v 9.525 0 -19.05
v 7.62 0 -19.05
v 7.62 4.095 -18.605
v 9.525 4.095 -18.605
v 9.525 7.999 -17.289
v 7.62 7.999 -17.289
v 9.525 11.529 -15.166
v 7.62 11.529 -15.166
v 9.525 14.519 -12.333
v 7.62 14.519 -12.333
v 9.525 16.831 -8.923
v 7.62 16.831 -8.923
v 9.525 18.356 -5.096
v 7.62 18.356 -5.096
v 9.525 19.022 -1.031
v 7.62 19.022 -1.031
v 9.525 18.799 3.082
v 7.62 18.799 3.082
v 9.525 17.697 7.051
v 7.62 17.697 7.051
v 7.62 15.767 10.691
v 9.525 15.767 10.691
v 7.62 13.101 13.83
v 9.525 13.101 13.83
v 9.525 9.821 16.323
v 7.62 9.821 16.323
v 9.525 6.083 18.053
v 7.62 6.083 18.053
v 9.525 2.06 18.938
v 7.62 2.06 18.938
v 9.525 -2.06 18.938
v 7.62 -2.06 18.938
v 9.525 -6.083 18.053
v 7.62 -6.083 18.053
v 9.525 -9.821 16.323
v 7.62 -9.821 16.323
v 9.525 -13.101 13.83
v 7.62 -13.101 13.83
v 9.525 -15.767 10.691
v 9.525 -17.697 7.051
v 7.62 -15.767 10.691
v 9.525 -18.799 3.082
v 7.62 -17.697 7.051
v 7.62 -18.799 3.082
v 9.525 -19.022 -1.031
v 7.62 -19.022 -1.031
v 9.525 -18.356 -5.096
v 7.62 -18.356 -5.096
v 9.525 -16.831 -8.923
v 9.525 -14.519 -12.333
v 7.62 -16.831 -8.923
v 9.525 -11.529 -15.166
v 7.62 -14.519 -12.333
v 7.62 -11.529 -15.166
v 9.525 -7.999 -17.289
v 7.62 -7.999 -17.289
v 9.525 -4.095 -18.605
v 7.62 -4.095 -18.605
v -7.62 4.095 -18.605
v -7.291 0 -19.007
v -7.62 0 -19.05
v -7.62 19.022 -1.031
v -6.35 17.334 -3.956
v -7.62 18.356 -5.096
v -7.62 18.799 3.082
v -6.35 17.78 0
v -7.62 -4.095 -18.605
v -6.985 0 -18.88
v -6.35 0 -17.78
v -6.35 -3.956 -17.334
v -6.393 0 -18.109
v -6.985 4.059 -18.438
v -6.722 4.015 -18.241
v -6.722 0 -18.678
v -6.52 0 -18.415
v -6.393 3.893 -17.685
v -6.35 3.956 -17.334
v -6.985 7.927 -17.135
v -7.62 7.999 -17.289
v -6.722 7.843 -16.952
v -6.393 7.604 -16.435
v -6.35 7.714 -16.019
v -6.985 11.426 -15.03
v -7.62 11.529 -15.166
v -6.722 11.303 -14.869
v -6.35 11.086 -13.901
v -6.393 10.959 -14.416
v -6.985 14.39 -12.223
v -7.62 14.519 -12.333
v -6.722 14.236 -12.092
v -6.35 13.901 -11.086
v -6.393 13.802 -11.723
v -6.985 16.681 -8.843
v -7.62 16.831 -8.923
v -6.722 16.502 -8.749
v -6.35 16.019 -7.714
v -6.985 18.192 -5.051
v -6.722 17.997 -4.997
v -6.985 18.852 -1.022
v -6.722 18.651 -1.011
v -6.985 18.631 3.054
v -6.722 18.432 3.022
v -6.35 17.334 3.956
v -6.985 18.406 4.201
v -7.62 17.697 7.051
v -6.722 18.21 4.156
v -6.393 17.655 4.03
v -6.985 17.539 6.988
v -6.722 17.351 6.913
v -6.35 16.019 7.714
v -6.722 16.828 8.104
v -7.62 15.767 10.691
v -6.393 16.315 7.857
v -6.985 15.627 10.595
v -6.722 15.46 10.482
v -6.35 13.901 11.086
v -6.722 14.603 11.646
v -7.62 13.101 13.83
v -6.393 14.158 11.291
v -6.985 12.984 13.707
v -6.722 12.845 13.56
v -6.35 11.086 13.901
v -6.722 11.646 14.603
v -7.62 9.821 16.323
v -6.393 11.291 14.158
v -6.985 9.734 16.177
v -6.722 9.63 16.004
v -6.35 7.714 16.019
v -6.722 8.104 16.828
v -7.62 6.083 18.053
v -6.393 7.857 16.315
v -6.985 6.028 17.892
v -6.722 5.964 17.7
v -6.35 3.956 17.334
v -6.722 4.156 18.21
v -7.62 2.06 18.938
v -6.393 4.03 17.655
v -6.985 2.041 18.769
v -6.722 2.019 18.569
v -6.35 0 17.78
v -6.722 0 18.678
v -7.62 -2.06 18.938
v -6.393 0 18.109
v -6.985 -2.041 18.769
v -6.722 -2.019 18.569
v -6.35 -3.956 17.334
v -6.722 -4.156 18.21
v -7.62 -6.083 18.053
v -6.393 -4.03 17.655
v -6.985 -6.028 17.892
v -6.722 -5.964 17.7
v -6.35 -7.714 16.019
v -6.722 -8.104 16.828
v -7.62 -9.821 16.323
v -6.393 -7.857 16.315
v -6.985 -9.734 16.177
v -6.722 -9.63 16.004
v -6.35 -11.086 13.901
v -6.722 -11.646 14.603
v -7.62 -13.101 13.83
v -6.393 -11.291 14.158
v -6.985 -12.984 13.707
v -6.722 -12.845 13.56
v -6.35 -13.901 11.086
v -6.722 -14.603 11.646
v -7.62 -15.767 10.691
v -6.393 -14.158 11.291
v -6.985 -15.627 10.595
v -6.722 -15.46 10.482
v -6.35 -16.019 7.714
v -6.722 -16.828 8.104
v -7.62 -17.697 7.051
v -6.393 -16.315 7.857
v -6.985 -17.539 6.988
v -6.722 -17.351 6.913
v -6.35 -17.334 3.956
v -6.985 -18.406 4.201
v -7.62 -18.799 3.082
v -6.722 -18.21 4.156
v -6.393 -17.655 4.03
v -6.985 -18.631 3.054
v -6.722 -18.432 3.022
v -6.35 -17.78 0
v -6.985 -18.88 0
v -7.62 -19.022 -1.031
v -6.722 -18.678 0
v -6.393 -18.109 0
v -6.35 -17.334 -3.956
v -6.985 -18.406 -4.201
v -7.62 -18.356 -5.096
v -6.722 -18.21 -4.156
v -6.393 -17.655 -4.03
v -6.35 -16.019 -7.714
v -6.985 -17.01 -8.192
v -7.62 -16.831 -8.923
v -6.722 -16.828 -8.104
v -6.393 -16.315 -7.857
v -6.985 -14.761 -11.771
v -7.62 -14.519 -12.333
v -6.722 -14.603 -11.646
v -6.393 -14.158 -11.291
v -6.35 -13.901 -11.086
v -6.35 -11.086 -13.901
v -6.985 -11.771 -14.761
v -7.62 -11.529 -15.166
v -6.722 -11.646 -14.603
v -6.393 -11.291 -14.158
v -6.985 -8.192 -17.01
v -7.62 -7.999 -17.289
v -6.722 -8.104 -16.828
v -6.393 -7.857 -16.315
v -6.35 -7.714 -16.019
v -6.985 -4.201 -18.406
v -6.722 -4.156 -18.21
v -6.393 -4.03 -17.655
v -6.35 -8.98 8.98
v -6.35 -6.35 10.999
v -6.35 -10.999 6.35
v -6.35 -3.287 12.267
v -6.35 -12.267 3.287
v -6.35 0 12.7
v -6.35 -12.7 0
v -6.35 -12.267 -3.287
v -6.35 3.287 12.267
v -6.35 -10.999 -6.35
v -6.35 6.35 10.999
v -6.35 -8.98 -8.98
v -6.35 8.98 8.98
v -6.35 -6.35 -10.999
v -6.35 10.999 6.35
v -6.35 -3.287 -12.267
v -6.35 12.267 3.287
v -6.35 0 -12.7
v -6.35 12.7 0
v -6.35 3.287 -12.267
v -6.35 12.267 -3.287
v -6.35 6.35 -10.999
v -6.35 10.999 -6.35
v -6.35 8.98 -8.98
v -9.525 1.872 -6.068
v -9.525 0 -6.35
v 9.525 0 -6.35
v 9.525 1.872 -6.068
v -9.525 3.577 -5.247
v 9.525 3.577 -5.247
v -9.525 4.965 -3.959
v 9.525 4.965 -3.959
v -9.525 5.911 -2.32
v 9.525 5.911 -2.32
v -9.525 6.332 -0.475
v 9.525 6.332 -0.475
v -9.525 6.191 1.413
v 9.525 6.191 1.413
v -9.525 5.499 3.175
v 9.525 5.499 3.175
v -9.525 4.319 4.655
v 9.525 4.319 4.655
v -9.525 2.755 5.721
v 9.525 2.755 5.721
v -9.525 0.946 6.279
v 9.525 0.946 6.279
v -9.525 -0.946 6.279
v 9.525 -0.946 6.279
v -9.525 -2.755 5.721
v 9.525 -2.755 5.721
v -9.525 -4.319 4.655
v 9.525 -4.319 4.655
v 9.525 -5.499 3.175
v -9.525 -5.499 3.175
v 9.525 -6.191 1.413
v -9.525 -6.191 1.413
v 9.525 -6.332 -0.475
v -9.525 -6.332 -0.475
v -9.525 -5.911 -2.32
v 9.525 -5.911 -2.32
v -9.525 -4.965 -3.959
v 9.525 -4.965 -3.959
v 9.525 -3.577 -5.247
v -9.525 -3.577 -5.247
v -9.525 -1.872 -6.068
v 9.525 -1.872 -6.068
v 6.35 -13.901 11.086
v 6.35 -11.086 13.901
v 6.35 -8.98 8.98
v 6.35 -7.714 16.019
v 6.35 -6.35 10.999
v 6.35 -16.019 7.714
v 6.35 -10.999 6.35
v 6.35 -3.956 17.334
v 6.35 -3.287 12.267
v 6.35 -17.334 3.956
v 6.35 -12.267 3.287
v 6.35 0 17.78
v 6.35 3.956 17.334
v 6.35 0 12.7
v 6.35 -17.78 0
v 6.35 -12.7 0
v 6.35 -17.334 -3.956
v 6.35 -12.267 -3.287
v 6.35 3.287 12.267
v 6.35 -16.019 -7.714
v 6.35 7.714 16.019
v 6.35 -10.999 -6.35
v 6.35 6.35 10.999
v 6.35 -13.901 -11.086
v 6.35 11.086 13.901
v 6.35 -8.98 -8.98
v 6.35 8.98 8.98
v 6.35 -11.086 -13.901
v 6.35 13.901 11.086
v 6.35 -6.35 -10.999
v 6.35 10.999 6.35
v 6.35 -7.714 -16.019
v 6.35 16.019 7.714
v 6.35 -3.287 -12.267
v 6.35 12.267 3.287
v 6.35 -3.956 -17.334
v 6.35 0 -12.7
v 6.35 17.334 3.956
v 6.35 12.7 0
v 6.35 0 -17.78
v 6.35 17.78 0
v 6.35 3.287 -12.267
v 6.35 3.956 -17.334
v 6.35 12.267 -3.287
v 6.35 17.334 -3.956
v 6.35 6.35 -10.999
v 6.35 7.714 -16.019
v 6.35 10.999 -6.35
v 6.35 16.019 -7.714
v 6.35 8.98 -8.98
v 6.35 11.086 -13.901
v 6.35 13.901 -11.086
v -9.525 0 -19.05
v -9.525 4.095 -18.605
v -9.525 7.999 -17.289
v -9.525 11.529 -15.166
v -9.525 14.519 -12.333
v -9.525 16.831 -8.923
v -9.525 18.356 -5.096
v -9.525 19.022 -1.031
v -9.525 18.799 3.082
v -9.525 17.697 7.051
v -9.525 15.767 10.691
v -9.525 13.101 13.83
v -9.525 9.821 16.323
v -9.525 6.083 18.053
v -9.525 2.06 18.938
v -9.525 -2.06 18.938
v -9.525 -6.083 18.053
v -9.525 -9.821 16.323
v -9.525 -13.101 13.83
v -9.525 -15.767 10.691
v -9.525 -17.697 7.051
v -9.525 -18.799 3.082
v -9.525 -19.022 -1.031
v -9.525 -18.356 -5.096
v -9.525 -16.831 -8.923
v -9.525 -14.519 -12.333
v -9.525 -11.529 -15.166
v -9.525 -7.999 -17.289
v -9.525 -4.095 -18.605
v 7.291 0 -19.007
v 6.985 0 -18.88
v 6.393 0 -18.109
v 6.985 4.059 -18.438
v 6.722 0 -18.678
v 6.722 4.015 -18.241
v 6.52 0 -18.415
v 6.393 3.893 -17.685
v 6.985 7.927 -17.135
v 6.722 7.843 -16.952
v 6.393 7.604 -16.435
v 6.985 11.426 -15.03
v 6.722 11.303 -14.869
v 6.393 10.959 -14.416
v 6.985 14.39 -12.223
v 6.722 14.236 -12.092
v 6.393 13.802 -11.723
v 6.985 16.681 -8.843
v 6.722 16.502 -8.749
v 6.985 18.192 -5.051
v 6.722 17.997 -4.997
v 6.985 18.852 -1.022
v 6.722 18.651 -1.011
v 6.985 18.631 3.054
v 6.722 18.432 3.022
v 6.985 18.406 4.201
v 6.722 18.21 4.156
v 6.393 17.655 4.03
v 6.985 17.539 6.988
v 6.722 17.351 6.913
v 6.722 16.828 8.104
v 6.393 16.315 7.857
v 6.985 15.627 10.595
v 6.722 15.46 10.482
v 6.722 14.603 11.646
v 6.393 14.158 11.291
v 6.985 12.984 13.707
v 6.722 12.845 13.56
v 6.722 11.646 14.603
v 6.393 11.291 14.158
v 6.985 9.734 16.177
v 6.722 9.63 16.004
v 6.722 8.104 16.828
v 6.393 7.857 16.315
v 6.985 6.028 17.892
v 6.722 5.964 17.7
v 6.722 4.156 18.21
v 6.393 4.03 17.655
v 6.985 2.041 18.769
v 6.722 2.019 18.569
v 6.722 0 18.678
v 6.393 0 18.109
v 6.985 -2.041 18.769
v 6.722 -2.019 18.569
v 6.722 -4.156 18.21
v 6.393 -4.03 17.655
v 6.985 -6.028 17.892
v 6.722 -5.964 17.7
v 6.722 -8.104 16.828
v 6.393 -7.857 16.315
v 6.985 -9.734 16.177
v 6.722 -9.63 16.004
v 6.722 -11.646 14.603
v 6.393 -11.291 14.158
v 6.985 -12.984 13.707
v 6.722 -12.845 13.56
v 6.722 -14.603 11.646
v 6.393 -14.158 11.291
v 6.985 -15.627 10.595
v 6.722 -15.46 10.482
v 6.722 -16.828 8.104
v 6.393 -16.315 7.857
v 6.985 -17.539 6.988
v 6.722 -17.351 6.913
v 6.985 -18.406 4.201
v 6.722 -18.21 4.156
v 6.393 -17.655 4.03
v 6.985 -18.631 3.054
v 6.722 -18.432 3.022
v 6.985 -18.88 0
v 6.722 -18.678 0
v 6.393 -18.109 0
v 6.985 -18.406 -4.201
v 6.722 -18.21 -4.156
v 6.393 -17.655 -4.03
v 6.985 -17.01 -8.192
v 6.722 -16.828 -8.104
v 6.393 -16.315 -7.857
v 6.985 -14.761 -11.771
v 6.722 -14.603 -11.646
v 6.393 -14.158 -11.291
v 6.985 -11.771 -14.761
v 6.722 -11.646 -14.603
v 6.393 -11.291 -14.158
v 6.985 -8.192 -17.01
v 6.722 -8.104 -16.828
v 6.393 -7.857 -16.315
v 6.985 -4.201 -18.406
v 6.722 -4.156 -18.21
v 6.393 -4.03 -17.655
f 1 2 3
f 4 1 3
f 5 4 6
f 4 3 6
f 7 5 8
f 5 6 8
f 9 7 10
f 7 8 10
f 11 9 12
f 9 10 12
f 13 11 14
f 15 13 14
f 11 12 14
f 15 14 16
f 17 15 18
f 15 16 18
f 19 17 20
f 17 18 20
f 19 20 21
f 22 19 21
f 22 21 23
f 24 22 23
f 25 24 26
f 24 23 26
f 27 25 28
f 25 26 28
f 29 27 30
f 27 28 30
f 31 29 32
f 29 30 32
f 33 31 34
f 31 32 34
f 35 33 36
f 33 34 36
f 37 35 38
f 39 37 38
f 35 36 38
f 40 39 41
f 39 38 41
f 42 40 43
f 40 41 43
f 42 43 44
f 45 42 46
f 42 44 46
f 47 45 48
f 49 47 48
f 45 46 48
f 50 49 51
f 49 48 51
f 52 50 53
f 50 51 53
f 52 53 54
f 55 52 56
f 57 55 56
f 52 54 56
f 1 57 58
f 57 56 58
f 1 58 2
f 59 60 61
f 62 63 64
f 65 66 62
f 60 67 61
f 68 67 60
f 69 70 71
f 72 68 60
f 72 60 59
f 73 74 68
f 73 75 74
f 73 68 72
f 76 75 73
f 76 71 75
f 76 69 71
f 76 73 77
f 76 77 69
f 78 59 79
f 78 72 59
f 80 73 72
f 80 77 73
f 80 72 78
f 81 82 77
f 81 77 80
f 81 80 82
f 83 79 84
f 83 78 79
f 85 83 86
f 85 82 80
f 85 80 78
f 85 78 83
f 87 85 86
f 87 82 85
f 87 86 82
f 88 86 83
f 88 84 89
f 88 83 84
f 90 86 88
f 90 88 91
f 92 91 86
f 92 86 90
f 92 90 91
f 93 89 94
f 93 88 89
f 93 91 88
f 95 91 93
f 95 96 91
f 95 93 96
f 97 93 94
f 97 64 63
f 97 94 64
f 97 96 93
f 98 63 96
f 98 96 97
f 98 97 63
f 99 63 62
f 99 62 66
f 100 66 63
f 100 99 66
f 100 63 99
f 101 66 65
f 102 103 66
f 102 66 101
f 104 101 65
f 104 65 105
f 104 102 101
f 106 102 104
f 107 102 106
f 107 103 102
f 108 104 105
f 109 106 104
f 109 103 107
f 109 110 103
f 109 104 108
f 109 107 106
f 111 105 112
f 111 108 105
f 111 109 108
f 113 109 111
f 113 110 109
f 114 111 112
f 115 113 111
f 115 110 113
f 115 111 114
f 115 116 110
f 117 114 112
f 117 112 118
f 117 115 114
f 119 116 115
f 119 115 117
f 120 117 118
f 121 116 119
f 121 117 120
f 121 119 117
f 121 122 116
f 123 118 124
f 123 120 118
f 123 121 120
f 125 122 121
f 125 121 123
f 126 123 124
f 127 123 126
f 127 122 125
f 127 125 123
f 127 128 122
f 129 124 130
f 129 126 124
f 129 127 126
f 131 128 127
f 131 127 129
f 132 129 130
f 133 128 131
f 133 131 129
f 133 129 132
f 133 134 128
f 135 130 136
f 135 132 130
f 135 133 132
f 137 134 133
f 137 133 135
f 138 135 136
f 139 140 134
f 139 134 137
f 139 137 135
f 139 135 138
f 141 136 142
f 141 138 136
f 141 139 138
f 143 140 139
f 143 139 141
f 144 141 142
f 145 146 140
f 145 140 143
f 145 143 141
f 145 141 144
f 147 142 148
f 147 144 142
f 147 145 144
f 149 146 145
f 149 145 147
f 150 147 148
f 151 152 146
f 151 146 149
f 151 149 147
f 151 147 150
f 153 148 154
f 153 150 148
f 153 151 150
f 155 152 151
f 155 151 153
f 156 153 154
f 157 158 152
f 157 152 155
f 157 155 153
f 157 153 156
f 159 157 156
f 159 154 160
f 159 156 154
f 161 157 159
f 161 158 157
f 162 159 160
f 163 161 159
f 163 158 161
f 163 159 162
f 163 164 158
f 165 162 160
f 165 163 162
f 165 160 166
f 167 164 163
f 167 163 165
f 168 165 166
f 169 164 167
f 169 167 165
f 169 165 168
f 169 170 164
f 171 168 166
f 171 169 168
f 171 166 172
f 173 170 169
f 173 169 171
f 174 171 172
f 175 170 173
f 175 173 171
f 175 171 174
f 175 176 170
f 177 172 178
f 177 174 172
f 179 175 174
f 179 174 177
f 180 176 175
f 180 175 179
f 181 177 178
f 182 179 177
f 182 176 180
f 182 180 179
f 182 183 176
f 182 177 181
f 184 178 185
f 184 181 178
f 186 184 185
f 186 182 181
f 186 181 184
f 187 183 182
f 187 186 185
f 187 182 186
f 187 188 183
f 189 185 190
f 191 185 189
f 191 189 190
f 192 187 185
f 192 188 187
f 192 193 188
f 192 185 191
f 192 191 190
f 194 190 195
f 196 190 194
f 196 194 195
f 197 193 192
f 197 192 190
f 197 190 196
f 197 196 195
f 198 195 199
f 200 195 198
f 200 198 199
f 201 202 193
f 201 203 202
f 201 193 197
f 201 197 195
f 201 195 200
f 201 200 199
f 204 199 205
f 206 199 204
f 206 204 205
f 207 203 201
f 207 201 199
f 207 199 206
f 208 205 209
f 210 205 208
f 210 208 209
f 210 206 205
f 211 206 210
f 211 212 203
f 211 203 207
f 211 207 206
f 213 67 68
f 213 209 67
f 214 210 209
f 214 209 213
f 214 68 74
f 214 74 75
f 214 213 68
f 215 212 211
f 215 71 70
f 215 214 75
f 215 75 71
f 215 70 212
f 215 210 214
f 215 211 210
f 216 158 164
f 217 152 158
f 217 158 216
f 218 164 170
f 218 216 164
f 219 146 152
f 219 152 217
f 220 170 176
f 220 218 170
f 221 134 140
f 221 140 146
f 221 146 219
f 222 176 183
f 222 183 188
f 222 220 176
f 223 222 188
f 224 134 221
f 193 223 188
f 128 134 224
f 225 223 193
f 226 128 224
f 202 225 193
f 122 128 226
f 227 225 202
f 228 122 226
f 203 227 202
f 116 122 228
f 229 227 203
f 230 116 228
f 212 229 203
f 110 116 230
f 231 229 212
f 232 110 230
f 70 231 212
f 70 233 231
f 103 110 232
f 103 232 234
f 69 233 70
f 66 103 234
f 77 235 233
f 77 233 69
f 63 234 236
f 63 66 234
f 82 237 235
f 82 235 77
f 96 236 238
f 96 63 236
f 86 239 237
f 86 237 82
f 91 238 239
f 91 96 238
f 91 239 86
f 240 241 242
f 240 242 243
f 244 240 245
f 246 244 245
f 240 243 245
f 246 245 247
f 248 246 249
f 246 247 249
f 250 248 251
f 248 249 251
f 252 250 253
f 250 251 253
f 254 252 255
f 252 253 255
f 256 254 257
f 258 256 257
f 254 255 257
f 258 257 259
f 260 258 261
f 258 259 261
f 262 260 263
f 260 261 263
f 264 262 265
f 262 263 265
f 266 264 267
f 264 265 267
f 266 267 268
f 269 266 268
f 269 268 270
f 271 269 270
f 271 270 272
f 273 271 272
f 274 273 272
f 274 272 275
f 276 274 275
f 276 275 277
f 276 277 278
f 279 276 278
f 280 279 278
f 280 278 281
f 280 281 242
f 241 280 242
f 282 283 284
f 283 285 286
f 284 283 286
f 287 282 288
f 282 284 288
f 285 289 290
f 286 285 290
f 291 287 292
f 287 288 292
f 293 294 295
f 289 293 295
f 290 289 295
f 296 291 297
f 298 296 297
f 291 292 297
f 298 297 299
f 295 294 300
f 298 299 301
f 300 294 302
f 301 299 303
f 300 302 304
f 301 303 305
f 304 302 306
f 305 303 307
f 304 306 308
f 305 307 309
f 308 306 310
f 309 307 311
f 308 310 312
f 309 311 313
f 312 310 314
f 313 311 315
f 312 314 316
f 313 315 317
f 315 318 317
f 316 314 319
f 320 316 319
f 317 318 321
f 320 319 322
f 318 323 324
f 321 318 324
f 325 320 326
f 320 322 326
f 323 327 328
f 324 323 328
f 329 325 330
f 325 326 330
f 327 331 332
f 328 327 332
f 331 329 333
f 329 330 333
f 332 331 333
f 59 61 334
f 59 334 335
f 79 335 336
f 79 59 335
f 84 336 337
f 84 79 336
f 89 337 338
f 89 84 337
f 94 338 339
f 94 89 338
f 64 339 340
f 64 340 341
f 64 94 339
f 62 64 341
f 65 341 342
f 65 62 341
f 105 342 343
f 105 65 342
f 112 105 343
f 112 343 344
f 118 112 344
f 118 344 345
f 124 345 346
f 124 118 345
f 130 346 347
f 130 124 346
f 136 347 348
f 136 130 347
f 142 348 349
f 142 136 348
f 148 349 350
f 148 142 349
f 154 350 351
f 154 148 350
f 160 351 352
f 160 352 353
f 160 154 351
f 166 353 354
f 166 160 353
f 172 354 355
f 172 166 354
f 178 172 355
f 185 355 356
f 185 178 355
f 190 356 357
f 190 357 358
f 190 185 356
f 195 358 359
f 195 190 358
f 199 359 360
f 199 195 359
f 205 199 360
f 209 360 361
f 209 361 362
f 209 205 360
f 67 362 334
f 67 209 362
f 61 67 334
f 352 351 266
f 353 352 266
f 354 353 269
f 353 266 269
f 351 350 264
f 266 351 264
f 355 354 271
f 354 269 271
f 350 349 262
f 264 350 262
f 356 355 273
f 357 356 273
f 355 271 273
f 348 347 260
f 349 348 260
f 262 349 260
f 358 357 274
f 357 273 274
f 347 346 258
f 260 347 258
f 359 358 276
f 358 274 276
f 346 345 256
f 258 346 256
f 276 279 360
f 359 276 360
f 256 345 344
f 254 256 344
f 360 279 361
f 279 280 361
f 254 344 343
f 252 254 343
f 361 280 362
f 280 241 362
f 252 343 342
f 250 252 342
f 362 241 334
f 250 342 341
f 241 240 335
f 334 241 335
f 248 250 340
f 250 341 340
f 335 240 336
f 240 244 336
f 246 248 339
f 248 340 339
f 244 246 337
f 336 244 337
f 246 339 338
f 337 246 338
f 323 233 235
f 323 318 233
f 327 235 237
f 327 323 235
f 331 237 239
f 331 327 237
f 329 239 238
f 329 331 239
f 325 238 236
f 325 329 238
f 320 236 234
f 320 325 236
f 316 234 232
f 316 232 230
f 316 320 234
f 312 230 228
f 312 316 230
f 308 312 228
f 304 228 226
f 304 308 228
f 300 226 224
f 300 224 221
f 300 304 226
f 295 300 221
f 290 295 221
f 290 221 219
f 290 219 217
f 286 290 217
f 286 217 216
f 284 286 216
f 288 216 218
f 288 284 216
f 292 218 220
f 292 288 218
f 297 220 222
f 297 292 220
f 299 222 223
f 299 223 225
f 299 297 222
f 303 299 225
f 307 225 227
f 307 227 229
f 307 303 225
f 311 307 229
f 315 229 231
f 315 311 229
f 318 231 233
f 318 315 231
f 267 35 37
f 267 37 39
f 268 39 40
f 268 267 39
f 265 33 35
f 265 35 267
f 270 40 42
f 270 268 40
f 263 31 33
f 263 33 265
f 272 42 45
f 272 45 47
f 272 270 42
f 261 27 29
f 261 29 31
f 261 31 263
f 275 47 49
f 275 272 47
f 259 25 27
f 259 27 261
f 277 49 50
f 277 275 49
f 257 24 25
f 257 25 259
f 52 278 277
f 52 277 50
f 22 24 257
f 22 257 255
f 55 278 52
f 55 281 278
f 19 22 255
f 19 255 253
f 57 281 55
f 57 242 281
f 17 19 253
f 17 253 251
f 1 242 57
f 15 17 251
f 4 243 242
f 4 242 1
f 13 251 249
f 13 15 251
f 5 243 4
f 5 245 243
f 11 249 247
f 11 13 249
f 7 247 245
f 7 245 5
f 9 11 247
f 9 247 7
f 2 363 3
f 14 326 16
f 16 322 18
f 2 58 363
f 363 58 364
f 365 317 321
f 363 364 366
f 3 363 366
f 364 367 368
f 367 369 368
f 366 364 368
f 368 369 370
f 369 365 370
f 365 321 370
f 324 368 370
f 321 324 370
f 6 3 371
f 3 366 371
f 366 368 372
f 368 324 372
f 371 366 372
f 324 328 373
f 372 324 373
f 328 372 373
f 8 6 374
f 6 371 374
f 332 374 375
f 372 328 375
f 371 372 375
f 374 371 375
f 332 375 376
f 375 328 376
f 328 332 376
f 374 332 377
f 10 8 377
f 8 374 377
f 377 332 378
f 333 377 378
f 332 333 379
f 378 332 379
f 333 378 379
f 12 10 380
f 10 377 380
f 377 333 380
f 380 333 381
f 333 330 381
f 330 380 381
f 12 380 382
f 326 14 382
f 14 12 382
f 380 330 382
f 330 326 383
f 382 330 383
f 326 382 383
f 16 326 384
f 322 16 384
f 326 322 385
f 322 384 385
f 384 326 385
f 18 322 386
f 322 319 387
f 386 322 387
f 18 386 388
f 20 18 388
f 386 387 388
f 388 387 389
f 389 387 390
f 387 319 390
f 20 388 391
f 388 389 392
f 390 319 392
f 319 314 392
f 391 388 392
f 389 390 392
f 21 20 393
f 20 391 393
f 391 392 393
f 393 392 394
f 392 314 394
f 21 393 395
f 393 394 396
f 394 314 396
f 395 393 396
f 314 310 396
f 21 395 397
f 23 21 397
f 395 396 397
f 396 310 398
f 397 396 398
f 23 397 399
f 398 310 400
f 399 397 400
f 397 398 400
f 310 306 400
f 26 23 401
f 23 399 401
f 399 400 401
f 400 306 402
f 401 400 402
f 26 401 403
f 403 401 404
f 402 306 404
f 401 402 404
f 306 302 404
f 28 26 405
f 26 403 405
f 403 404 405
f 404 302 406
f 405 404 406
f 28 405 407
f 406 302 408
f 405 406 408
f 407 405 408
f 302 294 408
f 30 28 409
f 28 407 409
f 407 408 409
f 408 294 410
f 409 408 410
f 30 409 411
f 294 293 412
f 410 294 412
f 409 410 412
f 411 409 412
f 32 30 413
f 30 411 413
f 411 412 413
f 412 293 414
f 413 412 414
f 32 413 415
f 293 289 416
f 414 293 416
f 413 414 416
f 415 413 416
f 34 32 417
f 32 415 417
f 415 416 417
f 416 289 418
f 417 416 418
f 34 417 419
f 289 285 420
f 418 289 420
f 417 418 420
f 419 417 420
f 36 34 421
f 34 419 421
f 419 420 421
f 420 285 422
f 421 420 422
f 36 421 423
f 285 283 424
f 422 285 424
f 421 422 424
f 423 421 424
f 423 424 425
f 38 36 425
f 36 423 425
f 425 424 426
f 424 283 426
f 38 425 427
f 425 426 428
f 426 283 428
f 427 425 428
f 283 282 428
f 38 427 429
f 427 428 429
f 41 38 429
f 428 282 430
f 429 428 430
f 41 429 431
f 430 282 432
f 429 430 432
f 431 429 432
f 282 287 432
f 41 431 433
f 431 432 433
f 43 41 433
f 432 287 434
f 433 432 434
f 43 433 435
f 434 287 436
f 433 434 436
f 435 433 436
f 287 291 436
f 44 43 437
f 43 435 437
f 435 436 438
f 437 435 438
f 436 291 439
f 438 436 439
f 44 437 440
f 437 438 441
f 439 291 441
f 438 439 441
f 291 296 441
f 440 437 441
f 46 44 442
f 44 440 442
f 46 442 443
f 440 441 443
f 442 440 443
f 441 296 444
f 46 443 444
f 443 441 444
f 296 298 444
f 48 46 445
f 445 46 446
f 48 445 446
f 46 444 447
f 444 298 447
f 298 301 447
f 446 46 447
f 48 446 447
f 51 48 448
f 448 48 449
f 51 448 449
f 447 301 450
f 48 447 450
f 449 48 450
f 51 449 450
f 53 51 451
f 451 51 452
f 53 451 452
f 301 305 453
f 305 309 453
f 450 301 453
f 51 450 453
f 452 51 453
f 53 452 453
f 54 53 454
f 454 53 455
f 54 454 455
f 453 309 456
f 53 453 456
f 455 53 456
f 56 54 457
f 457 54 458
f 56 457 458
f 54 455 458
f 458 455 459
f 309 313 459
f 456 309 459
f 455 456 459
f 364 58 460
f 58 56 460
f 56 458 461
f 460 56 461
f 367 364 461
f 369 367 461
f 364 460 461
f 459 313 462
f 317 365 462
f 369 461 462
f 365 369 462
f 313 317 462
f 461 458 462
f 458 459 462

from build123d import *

# Parameters (mm, degrees)
SKETCH1_R            = 12.7
BOSS_EXTRUDE1_DEPTH  = 6.35
SKETCH2_R            = 19.05
BOSS_EXTRUDE2_DEPTH  = 3.175
FILLET1_R            = 1.27
FILLET1_OF_MIRROR1_R = 1.27
CUT_EXTRUDE1_REACH   = 21.05
SKETCH3_R            = 6.35


with BuildPart() as part:
    # Sketch1 → Boss-Extrude1 (new body)
    with BuildSketch(Plane(origin=(0, 0, 0), x_dir=(0, 0, -1), z_dir=(1, 0, 0))):
        Circle(SKETCH1_R)
    boss_extrude1 = extrude(amount=BOSS_EXTRUDE1_DEPTH)

    # Sketch2 → Boss-Extrude2 (add)
    with BuildSketch(Plane(origin=(6.35, 0, 0), x_dir=(0, 0, -1), z_dir=(1, 0, 0))):
        Circle(SKETCH2_R)
    boss_extrude2 = extrude(amount=BOSS_EXTRUDE2_DEPTH)

    # Fillet1
    fillet1_edges = [part.edges().sort_by_distance(p)[0] for p in [
        (6.35, 0, 19.05),
    ]]
    fillet(fillet1_edges, radius=FILLET1_R)

    # Mirror1: Boss-Extrude1, Boss-Extrude2 across plane
    add(boss_extrude1.mirror(Plane(origin=(0, 0, 0), x_dir=(0, 0, 1), z_dir=(1, 0, 0))))
    add(boss_extrude2.mirror(Plane(origin=(0, 0, 0), x_dir=(0, 0, 1), z_dir=(1, 0, 0))))

    # Fillet1 of Mirror1
    fillet1_of_mirror1_edges = [part.edges().sort_by_distance(p)[0] for p in [
        (-6.35, 0, 19.05),
    ]]
    fillet(fillet1_of_mirror1_edges, radius=FILLET1_OF_MIRROR1_R)

    # Sketch3 → Cut-Extrude1 (cut, up to next)
    with BuildSketch(Plane(origin=(9.525, 0, 0), x_dir=(0, 0, -1), z_dir=(1, 0, 0)), mode=Mode.PRIVATE) as cut_extrude1_sk1:
        Circle(SKETCH3_R)
    cut_extrude1_tool1 = extrude(cut_extrude1_sk1.sketch, amount=-CUT_EXTRUDE1_REACH, mode=Mode.PRIVATE) & part.part
    add(cut_extrude1_tool1.solids().sort_by_distance((9.525, 0, 0))[0], mode=Mode.SUBTRACT)


solid = part.part
